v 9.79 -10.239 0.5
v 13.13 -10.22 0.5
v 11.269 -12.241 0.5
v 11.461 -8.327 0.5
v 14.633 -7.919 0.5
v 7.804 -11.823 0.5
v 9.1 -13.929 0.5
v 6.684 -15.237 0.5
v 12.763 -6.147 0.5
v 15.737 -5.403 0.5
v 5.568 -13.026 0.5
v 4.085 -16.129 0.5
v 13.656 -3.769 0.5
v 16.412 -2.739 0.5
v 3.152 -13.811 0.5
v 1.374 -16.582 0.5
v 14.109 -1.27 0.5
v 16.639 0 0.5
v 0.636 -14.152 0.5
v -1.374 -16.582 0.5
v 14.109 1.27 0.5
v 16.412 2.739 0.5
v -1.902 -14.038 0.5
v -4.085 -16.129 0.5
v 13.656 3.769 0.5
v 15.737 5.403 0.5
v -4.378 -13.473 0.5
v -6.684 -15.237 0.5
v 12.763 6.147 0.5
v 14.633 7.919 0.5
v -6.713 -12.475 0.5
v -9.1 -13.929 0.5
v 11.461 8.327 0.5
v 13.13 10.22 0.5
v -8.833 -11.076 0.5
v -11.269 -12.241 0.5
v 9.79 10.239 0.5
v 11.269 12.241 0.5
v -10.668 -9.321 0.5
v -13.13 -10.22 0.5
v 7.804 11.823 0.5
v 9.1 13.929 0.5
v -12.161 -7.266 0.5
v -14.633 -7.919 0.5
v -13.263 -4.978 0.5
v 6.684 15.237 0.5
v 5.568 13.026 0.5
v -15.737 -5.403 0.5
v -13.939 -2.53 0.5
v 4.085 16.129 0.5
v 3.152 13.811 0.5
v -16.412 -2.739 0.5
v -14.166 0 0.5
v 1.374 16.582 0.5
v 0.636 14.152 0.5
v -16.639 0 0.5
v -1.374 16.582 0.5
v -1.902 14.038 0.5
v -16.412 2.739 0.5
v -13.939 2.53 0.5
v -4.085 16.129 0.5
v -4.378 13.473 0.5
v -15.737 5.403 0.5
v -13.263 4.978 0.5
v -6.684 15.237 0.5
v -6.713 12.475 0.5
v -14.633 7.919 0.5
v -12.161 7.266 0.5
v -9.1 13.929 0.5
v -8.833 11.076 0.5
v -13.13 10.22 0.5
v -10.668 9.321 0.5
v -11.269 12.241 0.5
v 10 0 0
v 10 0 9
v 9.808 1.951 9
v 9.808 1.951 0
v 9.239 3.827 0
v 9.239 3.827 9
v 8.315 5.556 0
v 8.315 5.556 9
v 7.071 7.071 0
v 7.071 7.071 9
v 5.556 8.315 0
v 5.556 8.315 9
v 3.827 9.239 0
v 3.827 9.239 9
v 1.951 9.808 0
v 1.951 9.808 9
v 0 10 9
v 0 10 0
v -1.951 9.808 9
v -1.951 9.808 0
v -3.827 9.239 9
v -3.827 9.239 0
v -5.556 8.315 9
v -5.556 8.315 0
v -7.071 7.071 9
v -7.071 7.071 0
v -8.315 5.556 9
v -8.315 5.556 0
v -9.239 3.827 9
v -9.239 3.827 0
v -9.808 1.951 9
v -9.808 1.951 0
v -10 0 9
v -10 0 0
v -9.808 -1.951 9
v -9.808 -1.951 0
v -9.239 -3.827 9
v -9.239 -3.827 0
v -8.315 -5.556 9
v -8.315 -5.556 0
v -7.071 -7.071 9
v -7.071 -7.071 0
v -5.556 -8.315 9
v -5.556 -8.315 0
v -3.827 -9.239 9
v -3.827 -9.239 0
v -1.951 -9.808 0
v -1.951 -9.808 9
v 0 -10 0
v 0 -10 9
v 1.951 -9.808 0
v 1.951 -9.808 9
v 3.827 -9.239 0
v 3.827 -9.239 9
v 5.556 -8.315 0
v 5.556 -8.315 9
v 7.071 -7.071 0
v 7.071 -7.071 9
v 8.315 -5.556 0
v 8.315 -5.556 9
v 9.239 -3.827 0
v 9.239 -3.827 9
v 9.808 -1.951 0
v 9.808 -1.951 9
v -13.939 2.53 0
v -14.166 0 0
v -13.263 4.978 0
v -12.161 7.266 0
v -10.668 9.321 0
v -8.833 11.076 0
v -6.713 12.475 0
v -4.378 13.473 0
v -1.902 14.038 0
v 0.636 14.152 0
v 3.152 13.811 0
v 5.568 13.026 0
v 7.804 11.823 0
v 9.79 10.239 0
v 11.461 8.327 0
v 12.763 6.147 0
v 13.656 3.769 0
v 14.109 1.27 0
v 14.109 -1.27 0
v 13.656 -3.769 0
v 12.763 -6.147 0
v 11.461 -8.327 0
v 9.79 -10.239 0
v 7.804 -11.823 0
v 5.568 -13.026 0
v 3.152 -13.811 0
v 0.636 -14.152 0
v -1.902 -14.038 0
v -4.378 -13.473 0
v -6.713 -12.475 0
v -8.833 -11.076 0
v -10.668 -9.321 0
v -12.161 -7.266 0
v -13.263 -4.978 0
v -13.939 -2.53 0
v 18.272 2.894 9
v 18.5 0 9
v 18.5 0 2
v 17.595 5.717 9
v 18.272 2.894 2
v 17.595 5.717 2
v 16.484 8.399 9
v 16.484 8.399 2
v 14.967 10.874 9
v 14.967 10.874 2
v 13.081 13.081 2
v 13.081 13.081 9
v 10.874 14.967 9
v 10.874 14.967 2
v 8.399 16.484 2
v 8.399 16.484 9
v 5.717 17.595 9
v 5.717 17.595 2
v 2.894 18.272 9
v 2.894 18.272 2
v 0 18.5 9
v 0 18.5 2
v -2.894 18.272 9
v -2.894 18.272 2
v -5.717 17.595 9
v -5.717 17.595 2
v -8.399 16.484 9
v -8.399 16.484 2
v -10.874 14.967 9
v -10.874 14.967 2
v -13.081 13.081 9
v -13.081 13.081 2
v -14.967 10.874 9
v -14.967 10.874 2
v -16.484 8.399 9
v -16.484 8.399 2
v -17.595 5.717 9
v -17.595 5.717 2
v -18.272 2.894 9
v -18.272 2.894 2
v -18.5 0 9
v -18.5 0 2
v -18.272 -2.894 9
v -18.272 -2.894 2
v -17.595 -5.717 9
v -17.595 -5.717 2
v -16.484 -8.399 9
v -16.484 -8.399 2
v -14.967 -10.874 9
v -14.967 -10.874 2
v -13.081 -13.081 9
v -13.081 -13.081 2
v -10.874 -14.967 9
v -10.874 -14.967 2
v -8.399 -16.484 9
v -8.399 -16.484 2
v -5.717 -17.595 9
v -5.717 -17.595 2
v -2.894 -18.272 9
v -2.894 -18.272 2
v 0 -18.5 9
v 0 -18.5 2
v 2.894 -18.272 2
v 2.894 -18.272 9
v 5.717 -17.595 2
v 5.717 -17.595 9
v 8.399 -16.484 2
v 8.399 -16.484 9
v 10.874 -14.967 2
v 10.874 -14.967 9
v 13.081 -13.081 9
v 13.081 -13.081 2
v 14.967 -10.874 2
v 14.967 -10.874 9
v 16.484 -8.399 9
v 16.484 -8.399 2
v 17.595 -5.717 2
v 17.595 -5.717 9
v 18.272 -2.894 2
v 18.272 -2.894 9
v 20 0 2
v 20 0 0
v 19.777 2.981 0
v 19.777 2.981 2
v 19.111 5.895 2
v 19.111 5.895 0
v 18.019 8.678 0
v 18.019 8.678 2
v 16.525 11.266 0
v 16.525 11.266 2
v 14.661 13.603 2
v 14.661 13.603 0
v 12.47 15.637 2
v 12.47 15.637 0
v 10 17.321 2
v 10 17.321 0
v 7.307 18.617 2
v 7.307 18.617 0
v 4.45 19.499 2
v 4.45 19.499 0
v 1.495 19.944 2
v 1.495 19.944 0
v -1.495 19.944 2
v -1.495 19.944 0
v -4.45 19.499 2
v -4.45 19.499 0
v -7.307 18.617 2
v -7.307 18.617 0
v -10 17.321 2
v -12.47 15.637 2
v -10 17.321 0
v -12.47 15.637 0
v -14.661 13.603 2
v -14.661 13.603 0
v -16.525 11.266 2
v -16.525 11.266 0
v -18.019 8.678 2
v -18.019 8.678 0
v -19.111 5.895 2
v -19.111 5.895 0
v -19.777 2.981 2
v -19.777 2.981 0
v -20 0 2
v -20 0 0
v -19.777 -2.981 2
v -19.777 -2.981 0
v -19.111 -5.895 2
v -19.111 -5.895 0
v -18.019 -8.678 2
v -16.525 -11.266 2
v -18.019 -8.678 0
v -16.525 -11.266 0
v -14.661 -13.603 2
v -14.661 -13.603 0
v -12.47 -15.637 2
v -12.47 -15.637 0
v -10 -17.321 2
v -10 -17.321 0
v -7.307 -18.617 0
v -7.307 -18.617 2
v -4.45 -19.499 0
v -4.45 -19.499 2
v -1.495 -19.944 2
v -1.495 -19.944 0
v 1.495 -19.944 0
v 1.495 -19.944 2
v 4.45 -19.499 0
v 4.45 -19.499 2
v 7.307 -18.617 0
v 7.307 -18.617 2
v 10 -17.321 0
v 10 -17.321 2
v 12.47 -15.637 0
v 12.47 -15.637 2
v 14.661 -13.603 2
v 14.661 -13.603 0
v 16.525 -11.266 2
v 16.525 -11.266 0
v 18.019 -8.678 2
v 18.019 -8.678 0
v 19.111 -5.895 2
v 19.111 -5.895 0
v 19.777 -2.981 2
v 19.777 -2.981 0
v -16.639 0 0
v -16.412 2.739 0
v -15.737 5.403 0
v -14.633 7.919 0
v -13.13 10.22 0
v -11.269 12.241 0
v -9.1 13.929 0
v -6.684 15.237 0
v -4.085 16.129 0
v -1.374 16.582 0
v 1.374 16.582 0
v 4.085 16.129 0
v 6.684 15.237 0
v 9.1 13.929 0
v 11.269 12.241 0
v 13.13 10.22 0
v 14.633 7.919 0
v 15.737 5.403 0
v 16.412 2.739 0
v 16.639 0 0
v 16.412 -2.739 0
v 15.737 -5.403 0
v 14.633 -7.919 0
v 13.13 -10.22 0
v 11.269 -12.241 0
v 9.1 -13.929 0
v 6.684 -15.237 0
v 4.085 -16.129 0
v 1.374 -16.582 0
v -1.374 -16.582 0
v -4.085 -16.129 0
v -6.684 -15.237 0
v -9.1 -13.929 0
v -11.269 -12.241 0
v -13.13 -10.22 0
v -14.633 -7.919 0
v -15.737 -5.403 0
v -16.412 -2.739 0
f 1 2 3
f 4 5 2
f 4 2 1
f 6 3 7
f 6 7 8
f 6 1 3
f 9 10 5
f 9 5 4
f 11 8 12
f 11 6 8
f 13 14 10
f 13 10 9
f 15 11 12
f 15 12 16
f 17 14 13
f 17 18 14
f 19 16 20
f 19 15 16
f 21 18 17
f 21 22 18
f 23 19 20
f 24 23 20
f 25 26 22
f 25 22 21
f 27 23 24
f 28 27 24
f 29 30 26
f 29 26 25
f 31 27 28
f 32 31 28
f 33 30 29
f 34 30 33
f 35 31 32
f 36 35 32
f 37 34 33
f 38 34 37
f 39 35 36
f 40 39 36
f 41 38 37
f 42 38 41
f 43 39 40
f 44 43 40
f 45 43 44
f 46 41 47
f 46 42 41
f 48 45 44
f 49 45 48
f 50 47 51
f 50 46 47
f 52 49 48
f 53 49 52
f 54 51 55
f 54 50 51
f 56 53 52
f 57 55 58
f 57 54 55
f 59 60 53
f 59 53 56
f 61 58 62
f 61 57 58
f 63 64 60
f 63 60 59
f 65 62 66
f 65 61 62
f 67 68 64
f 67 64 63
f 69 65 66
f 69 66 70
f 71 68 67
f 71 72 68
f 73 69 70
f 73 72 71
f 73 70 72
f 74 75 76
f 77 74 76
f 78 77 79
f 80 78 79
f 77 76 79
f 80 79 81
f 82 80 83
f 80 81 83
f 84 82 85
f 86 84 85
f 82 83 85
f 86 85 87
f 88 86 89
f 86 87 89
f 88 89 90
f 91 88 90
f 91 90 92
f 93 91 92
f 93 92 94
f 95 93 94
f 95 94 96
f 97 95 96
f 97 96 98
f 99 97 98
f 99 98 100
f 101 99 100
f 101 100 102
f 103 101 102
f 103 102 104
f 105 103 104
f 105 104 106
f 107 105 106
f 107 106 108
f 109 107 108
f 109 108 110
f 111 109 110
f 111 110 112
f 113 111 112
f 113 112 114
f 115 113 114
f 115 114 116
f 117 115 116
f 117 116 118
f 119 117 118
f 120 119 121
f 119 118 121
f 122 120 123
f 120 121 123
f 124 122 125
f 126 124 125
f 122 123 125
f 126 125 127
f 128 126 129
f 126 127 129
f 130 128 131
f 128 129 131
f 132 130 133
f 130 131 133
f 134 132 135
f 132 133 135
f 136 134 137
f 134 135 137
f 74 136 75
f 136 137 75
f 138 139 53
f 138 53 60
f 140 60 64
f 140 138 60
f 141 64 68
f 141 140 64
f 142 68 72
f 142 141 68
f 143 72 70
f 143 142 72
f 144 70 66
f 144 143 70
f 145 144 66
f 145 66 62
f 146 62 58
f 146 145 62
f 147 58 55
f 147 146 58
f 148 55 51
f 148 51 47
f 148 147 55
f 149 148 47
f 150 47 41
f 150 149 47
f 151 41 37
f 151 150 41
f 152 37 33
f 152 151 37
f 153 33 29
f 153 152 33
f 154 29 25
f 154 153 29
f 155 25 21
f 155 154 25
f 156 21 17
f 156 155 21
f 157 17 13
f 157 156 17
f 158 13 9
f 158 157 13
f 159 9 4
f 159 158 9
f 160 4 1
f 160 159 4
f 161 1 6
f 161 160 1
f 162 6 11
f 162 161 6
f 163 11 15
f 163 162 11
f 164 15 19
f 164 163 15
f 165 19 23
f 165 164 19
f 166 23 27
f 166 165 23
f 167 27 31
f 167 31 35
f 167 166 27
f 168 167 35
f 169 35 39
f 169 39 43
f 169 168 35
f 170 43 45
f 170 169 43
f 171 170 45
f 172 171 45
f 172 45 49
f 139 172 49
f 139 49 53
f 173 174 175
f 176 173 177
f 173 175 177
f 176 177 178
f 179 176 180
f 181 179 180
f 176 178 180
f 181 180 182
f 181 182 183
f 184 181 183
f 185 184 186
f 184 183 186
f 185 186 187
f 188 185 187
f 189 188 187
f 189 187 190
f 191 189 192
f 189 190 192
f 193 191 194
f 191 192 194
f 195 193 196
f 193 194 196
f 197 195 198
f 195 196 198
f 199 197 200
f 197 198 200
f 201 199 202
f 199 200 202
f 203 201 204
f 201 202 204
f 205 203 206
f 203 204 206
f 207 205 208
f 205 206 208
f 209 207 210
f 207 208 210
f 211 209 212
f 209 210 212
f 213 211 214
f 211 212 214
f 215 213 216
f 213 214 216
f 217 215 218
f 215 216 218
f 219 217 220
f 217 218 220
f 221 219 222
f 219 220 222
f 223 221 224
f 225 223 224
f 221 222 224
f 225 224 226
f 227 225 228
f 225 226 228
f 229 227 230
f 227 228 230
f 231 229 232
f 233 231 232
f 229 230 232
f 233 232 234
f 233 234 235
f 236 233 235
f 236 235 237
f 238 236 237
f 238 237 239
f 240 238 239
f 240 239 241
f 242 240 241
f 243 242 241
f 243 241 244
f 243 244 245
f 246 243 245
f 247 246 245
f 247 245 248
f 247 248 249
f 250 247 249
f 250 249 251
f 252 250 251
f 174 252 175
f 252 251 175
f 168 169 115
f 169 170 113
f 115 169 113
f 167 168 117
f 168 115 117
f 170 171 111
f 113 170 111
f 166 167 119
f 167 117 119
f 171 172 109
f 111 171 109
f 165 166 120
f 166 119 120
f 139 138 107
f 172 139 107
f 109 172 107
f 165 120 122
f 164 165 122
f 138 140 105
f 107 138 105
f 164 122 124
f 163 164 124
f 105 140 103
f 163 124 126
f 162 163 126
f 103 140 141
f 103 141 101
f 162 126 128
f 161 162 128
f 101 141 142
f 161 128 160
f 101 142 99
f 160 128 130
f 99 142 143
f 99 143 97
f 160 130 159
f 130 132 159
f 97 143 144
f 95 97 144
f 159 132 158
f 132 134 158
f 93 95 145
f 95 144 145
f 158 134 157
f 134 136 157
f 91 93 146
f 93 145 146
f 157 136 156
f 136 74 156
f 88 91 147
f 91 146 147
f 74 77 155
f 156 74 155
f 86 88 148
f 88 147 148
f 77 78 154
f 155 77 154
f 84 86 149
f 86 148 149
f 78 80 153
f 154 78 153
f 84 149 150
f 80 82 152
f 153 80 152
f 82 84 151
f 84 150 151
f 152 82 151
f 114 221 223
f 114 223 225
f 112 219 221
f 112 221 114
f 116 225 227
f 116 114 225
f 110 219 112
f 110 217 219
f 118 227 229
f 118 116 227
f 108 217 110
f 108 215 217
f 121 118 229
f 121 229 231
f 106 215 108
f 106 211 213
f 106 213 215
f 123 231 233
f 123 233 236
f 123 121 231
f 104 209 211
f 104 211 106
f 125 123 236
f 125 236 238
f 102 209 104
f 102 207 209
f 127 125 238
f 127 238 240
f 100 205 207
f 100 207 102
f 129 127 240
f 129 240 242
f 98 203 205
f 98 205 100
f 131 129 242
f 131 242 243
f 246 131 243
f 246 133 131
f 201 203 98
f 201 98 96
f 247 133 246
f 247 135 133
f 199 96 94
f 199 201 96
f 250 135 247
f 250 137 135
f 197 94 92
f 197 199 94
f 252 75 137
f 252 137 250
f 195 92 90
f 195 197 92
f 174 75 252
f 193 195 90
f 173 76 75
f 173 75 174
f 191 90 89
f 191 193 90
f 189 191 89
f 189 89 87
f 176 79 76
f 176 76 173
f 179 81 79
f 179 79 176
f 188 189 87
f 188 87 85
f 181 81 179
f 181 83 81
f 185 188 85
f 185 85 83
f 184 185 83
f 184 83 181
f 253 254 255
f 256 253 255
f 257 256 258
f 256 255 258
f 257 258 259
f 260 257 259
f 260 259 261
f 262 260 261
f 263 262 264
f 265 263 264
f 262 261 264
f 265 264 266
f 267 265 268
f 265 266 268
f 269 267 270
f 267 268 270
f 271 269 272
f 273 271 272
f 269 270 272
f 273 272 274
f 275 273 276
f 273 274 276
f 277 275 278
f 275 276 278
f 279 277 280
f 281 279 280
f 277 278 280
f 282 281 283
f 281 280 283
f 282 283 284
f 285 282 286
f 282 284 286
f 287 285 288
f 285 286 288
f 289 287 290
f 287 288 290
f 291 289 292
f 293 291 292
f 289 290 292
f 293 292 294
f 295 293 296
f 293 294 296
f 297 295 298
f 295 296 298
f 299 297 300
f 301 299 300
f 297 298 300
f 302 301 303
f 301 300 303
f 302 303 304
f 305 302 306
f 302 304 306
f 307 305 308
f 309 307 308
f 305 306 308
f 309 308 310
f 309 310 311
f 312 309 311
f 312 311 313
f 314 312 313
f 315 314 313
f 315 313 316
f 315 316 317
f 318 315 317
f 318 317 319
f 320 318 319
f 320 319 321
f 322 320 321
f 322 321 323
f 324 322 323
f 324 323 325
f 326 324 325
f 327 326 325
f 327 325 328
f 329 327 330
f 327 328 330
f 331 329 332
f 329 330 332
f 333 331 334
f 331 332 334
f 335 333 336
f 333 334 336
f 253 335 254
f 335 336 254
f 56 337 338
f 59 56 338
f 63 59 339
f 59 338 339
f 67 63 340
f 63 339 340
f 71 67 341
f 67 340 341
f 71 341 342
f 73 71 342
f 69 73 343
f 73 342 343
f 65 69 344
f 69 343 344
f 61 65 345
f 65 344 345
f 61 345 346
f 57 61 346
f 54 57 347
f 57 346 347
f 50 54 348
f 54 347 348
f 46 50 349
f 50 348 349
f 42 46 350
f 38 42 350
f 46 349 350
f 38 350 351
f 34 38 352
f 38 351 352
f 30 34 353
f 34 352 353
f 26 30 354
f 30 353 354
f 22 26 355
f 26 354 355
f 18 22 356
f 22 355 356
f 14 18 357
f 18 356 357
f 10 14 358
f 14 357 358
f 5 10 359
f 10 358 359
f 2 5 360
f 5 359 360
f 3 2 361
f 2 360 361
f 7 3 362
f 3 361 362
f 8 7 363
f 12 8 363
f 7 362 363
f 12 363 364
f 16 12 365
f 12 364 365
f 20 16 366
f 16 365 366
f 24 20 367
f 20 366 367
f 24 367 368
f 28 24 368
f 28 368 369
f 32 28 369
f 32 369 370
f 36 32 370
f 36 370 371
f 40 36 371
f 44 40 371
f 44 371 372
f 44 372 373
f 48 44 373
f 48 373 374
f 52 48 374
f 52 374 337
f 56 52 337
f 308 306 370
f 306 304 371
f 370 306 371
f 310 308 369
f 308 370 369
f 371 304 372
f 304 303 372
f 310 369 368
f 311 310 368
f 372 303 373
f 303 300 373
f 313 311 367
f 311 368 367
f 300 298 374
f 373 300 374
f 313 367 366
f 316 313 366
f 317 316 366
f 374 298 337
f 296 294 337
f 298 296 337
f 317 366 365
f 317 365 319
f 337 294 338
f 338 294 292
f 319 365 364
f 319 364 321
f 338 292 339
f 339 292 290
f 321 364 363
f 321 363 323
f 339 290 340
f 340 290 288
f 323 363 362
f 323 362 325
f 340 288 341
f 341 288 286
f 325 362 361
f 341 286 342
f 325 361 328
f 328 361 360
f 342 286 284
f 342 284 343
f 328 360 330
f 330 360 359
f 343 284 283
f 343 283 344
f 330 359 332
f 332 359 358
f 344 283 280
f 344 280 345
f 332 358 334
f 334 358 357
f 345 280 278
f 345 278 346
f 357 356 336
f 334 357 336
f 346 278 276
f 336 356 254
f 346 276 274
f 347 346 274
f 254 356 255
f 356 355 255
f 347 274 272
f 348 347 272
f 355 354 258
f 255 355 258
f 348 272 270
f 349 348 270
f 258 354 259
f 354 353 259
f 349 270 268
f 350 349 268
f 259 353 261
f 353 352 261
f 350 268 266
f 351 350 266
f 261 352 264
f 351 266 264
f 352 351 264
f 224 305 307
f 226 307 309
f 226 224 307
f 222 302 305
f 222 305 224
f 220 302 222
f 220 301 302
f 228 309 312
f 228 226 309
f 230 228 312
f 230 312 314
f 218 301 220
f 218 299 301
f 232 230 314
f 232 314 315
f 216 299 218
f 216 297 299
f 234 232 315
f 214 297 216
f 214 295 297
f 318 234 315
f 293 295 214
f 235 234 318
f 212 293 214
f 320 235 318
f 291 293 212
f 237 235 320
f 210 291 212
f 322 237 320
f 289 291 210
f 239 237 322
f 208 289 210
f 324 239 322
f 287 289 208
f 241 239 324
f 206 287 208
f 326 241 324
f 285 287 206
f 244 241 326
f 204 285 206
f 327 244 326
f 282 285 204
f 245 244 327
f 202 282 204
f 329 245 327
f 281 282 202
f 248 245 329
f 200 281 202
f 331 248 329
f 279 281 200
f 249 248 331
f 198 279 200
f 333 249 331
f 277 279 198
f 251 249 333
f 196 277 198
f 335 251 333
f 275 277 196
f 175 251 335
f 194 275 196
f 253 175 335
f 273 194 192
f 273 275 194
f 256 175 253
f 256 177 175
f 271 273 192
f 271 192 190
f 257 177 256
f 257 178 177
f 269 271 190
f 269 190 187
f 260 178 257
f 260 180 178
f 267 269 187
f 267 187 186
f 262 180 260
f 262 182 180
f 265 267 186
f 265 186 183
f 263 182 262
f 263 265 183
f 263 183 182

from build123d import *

# Parameters (mm, degrees)
SKETCH_1_R          = 20
EXTRUDE_1_DEPTH     = 2
SKETCH_2_R          = 18.5
EXTRUDE_2_DEPTH     = 7
SKETCH_3_R          = 10
CUT_EXTRUDE_1_DEPTH = 30.681644159
SKETCH_4_R          = 16.638615911
SKETCH_4_R_2        = 14.166384124
CUT_EXTRUDE_2_DEPTH = 0.5


with BuildPart() as part:
    # 草图1 → 凸台-拉伸1 (new body)
    with BuildSketch(Plane.XY):
        Circle(SKETCH_1_R)
    extrude(amount=EXTRUDE_1_DEPTH)

    # 草图2 → 凸台-拉伸2 (add)
    with BuildSketch(Plane.XY.offset(2)):
        Circle(SKETCH_2_R)
    extrude(amount=EXTRUDE_2_DEPTH)

    # 草图3 → 切除-拉伸1 (cut, through all)
    with BuildSketch(Plane.XY.offset(9)):
        Circle(SKETCH_3_R)
    extrude(amount=-CUT_EXTRUDE_1_DEPTH, mode=Mode.SUBTRACT)

    # 草图4 → 切除-拉伸2 (cut)
    with BuildSketch(Plane(origin=(0, 0, 0), x_dir=(-1, 0, 0), z_dir=(0, 0, -1))):
        Circle(SKETCH_4_R)
        Circle(SKETCH_4_R_2, mode=Mode.SUBTRACT)
    extrude(amount=-CUT_EXTRUDE_2_DEPTH, mode=Mode.SUBTRACT)


solid = part.part
